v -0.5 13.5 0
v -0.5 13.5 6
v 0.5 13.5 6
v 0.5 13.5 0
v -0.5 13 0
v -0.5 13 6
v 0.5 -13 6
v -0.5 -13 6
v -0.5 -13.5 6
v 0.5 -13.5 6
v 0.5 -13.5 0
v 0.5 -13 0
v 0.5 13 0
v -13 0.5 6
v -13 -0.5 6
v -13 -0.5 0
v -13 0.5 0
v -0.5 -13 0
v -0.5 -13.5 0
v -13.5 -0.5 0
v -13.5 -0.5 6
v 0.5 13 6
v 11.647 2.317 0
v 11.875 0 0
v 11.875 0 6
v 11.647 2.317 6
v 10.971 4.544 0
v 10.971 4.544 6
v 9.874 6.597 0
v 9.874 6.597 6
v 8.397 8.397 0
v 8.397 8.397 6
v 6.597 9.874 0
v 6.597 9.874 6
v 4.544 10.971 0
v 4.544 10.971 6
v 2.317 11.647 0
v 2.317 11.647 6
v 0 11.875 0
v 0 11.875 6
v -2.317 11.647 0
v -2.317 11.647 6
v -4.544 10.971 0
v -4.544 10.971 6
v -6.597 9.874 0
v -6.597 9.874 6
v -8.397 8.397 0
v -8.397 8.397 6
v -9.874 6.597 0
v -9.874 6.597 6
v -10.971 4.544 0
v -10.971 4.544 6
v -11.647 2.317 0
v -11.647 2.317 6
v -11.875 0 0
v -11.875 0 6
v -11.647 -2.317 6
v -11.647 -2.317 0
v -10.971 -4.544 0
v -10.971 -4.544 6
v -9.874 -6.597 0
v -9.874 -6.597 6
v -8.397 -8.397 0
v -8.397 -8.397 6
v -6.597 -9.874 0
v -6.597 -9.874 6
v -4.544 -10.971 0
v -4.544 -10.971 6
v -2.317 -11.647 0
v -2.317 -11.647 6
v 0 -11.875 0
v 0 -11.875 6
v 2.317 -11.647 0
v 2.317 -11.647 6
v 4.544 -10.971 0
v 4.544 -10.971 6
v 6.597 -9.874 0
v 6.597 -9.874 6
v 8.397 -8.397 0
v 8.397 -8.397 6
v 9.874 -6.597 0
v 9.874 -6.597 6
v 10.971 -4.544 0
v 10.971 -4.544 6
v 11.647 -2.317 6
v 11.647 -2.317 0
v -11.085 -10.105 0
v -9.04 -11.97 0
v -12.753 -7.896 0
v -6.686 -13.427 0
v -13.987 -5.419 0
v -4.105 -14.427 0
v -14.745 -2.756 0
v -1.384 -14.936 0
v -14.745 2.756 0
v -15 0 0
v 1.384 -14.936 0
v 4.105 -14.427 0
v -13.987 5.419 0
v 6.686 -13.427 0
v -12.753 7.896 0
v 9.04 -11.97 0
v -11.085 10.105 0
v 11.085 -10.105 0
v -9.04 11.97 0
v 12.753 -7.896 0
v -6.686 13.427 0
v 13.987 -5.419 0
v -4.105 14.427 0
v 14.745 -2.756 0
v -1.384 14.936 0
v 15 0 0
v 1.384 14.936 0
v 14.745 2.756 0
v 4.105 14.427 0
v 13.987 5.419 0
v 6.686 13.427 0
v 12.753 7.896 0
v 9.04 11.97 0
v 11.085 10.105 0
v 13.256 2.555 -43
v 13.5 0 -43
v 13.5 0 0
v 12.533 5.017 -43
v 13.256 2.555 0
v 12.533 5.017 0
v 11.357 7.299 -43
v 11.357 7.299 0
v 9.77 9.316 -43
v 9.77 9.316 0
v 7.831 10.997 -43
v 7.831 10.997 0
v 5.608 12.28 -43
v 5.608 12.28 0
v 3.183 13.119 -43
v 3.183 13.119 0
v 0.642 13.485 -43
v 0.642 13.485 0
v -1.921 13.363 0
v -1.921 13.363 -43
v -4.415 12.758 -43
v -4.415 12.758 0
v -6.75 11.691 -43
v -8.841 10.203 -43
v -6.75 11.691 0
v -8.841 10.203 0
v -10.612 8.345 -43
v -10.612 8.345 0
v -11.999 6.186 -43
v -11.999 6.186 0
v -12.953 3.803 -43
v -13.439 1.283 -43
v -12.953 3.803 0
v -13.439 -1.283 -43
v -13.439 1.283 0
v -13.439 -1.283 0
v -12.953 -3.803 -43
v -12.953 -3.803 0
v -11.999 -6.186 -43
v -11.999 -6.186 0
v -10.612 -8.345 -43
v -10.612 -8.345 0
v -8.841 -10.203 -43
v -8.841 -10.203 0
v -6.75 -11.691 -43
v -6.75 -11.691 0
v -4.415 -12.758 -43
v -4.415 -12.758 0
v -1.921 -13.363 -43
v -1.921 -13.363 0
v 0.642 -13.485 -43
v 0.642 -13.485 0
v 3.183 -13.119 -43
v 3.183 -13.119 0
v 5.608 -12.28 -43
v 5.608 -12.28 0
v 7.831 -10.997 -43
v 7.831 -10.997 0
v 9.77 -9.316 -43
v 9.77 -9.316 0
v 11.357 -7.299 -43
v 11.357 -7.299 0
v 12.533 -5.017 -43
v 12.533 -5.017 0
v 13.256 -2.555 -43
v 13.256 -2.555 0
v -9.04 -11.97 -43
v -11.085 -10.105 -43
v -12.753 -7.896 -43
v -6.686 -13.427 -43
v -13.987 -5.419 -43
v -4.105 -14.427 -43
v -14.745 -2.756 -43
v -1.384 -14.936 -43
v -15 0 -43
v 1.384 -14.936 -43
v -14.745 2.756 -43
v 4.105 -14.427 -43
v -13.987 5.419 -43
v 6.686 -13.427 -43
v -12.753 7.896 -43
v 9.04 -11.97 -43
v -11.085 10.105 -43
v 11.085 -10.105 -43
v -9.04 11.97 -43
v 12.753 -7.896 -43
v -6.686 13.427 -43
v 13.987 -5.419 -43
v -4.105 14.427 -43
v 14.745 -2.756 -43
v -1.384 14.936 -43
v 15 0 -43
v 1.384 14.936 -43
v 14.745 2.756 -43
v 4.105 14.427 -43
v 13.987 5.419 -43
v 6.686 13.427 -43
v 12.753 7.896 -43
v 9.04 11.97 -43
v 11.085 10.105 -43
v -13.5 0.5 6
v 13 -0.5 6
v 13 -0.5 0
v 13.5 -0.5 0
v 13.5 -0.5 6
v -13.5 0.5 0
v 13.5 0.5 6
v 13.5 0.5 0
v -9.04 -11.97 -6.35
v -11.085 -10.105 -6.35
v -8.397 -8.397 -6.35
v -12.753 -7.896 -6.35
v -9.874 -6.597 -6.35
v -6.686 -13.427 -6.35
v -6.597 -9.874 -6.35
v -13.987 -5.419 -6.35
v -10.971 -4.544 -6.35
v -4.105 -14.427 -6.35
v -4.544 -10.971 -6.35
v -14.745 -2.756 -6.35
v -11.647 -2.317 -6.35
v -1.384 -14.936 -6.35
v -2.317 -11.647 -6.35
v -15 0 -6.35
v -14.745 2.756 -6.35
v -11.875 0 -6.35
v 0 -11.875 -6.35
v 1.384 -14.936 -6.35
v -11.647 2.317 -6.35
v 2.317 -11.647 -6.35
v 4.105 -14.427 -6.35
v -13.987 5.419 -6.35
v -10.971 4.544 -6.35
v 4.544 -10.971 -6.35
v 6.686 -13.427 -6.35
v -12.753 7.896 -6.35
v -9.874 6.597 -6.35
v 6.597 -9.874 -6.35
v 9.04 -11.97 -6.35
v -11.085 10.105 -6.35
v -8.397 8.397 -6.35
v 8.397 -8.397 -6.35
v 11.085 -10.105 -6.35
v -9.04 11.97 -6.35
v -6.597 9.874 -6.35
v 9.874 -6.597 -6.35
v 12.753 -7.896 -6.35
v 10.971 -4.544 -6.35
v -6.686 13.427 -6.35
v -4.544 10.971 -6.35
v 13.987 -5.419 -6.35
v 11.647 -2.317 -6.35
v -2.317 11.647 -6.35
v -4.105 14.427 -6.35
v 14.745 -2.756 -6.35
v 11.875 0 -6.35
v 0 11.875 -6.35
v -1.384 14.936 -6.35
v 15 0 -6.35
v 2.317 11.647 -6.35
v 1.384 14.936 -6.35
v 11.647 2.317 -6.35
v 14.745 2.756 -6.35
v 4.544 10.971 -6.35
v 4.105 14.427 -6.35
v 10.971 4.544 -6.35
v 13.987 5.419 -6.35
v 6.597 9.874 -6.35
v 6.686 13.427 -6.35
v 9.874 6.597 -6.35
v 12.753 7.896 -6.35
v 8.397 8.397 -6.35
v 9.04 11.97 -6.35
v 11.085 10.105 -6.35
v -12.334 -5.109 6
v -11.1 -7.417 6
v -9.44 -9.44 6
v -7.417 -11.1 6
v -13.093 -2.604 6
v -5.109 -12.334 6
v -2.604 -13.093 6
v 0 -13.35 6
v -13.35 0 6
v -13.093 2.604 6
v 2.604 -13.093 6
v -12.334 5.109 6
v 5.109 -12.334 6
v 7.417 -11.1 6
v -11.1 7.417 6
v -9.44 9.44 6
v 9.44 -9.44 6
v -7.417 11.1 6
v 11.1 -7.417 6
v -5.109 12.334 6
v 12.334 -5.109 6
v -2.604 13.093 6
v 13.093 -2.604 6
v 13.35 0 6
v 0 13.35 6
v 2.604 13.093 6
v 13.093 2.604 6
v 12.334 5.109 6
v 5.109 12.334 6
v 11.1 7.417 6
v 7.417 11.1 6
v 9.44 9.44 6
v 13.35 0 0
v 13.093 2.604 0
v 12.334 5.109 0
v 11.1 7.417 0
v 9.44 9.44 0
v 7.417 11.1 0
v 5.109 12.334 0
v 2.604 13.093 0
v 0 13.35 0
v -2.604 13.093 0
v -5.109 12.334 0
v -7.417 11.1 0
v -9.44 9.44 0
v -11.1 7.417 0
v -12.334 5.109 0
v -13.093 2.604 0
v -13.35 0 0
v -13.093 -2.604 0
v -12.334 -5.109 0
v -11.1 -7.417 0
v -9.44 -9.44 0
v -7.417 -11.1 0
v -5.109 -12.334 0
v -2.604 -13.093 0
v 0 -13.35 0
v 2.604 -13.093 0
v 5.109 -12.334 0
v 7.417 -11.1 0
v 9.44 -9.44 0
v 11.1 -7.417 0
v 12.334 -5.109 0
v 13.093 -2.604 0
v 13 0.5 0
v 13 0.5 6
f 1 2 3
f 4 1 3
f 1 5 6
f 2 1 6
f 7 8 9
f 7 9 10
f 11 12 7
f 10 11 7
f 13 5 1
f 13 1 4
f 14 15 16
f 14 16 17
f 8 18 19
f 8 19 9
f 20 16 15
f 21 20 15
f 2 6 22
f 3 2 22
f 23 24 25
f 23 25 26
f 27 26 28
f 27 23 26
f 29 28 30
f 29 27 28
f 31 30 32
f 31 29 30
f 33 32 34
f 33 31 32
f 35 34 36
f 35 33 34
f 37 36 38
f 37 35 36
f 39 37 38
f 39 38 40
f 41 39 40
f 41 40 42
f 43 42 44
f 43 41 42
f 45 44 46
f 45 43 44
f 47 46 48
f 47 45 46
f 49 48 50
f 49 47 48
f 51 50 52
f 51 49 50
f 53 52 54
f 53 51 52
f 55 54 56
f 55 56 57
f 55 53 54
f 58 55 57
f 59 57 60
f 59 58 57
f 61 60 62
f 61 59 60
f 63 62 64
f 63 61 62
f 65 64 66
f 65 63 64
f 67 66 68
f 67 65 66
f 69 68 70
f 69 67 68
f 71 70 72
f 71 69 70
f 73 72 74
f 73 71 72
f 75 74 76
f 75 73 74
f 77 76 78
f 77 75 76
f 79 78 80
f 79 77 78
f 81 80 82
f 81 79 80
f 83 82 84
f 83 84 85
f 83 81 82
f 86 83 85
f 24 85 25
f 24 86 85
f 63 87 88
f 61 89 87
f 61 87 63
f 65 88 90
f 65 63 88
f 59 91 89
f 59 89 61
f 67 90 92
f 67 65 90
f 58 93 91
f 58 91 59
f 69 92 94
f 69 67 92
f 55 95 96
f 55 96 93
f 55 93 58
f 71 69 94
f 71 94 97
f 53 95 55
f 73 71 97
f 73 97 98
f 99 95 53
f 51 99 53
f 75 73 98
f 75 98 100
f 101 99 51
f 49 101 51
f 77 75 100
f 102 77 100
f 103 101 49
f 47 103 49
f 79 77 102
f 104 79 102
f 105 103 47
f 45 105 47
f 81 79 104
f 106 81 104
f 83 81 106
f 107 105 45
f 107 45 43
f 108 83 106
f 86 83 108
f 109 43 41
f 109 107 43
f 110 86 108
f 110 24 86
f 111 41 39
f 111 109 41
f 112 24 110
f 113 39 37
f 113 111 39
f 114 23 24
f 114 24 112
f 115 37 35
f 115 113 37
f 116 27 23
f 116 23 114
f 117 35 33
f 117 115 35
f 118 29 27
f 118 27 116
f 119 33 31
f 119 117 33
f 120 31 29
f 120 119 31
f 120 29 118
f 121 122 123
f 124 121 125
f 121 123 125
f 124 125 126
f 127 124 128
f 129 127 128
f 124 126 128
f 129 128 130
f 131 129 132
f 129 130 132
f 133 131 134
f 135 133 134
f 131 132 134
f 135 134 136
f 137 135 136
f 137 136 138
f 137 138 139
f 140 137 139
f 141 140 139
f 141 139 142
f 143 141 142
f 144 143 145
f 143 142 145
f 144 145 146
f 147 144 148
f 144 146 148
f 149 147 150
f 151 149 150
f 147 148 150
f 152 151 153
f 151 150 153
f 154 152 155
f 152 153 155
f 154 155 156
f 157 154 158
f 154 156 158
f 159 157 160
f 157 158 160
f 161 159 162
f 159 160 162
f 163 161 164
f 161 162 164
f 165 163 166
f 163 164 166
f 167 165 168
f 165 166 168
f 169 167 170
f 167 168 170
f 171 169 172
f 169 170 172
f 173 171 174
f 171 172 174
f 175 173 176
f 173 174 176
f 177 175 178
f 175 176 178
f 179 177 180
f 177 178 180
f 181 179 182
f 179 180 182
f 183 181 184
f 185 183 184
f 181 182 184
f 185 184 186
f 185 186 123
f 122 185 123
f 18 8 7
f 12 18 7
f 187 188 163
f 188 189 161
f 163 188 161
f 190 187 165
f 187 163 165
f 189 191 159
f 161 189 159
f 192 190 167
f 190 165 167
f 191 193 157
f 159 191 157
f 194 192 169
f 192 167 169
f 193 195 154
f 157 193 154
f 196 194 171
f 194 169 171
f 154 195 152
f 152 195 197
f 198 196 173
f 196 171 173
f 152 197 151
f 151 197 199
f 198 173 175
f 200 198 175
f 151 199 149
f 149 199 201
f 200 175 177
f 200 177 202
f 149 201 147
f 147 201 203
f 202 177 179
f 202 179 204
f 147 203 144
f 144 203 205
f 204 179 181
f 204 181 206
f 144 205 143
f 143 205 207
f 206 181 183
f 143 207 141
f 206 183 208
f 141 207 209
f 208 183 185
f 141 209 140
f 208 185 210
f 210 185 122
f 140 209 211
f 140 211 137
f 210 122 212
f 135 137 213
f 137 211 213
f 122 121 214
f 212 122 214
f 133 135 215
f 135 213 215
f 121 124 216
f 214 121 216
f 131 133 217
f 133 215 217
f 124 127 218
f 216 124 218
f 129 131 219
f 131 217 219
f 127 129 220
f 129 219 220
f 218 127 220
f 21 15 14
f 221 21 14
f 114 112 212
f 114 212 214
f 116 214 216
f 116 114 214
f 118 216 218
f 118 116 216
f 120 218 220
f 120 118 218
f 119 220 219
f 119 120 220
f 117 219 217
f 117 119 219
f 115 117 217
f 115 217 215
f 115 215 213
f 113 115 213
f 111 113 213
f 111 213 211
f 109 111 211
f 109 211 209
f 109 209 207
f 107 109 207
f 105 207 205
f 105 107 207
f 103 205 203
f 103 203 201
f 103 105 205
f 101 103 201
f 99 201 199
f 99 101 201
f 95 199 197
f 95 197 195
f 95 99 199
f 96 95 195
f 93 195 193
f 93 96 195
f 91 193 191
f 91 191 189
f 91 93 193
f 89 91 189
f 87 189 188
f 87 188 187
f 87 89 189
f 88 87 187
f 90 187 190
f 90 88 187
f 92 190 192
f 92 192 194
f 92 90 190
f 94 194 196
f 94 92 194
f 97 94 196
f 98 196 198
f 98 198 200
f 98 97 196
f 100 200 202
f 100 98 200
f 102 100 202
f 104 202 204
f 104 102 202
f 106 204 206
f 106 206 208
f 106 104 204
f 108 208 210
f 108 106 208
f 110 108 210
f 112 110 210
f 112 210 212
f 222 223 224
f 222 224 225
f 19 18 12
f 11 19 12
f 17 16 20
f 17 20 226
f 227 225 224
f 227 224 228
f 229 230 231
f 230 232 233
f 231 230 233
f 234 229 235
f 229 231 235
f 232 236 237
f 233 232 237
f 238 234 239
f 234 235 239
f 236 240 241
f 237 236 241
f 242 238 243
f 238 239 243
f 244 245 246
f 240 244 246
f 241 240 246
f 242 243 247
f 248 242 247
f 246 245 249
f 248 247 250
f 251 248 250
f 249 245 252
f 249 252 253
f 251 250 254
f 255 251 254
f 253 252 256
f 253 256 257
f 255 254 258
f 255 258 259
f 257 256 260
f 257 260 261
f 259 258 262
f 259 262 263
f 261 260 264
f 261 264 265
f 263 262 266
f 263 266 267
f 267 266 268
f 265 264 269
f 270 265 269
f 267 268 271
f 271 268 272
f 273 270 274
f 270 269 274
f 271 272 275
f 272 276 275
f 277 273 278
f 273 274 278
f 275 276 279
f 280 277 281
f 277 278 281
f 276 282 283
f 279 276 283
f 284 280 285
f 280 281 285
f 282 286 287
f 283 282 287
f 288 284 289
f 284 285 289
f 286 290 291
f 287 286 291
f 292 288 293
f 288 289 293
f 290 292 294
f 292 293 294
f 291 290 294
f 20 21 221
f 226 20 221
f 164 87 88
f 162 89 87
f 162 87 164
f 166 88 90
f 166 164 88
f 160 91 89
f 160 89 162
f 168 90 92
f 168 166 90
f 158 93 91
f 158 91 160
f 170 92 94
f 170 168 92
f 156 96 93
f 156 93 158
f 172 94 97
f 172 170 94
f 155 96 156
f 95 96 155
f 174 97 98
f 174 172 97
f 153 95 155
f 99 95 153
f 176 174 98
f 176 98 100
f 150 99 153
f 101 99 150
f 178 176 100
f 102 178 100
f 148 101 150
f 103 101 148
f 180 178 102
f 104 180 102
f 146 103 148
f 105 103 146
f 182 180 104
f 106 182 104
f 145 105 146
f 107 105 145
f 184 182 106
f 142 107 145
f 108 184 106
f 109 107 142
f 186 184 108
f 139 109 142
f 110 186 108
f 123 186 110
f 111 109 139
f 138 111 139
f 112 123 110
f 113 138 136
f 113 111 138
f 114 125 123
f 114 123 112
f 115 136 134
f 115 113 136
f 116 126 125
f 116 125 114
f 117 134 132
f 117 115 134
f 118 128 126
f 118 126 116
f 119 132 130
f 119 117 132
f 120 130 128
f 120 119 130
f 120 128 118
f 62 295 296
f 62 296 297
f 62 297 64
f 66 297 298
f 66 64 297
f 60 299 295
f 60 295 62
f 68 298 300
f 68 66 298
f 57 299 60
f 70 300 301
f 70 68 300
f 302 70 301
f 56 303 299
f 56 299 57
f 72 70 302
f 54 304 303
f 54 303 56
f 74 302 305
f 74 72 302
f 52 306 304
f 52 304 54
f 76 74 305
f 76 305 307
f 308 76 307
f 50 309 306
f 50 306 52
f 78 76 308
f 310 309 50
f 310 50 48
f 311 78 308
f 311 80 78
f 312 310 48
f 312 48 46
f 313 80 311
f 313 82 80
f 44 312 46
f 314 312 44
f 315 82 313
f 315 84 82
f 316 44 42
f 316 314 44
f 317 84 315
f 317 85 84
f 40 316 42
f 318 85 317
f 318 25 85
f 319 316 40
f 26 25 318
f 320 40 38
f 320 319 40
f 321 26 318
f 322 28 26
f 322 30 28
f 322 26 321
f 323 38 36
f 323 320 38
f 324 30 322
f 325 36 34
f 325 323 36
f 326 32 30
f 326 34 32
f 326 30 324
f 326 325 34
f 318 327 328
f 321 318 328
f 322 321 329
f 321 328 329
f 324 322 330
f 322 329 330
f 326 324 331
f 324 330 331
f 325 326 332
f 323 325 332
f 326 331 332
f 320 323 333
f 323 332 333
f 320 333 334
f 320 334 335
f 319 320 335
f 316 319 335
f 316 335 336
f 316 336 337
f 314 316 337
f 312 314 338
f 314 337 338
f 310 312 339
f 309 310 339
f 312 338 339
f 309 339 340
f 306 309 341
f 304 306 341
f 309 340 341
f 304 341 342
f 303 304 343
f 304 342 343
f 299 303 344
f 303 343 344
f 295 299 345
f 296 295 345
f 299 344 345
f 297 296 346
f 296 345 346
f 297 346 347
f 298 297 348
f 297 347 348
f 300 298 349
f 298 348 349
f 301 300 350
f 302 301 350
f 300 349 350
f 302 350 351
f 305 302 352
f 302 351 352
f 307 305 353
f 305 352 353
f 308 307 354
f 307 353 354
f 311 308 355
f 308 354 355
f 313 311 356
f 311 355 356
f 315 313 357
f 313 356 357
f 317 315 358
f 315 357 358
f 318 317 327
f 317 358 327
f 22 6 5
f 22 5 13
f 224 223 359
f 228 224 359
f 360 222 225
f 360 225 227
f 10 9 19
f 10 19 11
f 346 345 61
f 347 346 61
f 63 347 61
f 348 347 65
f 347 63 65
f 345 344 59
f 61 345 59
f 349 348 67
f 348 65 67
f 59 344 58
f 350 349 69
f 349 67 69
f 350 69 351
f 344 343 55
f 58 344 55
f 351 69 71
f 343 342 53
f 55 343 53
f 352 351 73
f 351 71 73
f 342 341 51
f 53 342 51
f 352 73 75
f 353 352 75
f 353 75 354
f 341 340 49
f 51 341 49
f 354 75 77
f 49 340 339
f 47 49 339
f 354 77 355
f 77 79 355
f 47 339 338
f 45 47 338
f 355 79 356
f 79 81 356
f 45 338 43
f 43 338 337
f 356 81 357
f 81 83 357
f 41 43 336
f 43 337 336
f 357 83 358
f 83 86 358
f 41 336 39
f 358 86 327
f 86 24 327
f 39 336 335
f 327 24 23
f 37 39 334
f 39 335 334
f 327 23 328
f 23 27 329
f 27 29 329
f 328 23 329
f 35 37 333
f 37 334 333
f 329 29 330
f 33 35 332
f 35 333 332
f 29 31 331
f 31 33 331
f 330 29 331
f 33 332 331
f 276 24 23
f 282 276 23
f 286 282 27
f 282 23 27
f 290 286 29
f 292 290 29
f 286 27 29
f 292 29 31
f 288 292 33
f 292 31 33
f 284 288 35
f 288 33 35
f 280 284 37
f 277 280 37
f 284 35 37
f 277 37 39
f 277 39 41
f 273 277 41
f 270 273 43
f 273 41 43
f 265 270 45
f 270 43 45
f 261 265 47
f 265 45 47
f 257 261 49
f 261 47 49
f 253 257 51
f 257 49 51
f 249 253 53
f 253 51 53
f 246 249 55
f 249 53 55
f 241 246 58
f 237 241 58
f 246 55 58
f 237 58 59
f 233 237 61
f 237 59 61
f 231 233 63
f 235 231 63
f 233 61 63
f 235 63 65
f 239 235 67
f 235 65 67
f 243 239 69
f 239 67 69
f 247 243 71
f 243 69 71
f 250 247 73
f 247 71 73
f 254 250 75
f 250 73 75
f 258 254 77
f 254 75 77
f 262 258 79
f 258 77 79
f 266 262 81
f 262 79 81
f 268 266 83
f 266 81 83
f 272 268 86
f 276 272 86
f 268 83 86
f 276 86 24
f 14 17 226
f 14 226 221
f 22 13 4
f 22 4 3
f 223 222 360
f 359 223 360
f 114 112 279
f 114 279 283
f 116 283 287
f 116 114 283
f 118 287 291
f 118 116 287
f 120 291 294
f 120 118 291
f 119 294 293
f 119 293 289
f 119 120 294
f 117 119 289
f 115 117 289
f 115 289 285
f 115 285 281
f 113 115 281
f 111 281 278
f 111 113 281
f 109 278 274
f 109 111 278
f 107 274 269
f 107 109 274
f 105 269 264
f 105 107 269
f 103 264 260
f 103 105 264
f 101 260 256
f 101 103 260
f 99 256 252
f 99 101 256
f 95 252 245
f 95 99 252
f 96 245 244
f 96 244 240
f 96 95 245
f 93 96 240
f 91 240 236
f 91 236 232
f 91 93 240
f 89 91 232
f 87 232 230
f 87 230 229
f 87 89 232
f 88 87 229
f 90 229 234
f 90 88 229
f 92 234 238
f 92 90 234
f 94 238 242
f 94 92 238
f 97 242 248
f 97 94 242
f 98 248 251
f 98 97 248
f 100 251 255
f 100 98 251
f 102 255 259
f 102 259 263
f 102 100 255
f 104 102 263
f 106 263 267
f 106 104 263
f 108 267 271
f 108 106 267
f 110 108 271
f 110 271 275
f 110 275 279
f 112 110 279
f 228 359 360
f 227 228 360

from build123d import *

# Parameters (mm, degrees)
F0_R      = 13.35
F0_R_2    = 11.875
F1_DEPTH  = 6
F2_R      = 15
F2_R_2    = 13.5
F3_DEPTH  = 43
F4_R      = 15
F4_R_2    = 11.875
F5_DEPTH  = 6.35
F7_W      = 1
F7_H      = 6
F8_DEPTH  = 0.5
F10_W     = 1
F10_H     = 6
F11_DEPTH = 0.5
F13_W     = 1
F13_H     = 6
F14_DEPTH = 0.5
F16_W     = 1
F16_H     = 6
F17_DEPTH = 0.5


with BuildPart() as f1:
    # F0 (on Top) → F1 (new body)
    with BuildSketch(Plane.XY):
        Circle(F0_R)
        Circle(F0_R_2, mode=Mode.SUBTRACT)
    extrude(amount=F1_DEPTH)


with BuildPart() as f3:
    # F2 (on Top) → F3 (new body)
    with BuildSketch(Plane.XY):
        Circle(F2_R)
        Circle(F2_R_2, mode=Mode.SUBTRACT)
    extrude(amount=-F3_DEPTH)


with BuildPart() as f5:
    # F4 (on Top) → F5 (new body)
    with BuildSketch(Plane.XY):
        Circle(F4_R)
        Circle(F4_R_2, mode=Mode.SUBTRACT)
    extrude(amount=-F5_DEPTH)


with BuildPart() as f8:
    # F7 (on offset) → F8 (new body)
    with BuildSketch(Plane.YZ.offset(13)):
        with Locations((0, 3)):
            Rectangle(F7_W, F7_H)
    extrude(amount=F8_DEPTH)


with BuildPart() as f11:
    # F10 (on offset) → F11 (new body)
    with BuildSketch(Plane.YZ.offset(-13)):
        with Locations((0, 3)):
            Rectangle(F10_W, F10_H)
    extrude(amount=-F11_DEPTH)


with BuildPart() as f14:
    # F13 (on offset) → F14 (new body)
    with BuildSketch(Plane.XZ.offset(-13)):
        with Locations((0, 3)):
            Rectangle(F13_W, F13_H)
    extrude(amount=-F14_DEPTH)


with BuildPart() as f17:
    # F16 (on offset) → F17 (new body)
    with BuildSketch(Plane.XZ.offset(13)):
        with Locations((0, 3)):
            Rectangle(F16_W, F16_H)
    extrude(amount=F17_DEPTH)


solid = Compound([f1.part, f3.part, f5.part, f8.part, f11.part, f14.part, f17.part])
